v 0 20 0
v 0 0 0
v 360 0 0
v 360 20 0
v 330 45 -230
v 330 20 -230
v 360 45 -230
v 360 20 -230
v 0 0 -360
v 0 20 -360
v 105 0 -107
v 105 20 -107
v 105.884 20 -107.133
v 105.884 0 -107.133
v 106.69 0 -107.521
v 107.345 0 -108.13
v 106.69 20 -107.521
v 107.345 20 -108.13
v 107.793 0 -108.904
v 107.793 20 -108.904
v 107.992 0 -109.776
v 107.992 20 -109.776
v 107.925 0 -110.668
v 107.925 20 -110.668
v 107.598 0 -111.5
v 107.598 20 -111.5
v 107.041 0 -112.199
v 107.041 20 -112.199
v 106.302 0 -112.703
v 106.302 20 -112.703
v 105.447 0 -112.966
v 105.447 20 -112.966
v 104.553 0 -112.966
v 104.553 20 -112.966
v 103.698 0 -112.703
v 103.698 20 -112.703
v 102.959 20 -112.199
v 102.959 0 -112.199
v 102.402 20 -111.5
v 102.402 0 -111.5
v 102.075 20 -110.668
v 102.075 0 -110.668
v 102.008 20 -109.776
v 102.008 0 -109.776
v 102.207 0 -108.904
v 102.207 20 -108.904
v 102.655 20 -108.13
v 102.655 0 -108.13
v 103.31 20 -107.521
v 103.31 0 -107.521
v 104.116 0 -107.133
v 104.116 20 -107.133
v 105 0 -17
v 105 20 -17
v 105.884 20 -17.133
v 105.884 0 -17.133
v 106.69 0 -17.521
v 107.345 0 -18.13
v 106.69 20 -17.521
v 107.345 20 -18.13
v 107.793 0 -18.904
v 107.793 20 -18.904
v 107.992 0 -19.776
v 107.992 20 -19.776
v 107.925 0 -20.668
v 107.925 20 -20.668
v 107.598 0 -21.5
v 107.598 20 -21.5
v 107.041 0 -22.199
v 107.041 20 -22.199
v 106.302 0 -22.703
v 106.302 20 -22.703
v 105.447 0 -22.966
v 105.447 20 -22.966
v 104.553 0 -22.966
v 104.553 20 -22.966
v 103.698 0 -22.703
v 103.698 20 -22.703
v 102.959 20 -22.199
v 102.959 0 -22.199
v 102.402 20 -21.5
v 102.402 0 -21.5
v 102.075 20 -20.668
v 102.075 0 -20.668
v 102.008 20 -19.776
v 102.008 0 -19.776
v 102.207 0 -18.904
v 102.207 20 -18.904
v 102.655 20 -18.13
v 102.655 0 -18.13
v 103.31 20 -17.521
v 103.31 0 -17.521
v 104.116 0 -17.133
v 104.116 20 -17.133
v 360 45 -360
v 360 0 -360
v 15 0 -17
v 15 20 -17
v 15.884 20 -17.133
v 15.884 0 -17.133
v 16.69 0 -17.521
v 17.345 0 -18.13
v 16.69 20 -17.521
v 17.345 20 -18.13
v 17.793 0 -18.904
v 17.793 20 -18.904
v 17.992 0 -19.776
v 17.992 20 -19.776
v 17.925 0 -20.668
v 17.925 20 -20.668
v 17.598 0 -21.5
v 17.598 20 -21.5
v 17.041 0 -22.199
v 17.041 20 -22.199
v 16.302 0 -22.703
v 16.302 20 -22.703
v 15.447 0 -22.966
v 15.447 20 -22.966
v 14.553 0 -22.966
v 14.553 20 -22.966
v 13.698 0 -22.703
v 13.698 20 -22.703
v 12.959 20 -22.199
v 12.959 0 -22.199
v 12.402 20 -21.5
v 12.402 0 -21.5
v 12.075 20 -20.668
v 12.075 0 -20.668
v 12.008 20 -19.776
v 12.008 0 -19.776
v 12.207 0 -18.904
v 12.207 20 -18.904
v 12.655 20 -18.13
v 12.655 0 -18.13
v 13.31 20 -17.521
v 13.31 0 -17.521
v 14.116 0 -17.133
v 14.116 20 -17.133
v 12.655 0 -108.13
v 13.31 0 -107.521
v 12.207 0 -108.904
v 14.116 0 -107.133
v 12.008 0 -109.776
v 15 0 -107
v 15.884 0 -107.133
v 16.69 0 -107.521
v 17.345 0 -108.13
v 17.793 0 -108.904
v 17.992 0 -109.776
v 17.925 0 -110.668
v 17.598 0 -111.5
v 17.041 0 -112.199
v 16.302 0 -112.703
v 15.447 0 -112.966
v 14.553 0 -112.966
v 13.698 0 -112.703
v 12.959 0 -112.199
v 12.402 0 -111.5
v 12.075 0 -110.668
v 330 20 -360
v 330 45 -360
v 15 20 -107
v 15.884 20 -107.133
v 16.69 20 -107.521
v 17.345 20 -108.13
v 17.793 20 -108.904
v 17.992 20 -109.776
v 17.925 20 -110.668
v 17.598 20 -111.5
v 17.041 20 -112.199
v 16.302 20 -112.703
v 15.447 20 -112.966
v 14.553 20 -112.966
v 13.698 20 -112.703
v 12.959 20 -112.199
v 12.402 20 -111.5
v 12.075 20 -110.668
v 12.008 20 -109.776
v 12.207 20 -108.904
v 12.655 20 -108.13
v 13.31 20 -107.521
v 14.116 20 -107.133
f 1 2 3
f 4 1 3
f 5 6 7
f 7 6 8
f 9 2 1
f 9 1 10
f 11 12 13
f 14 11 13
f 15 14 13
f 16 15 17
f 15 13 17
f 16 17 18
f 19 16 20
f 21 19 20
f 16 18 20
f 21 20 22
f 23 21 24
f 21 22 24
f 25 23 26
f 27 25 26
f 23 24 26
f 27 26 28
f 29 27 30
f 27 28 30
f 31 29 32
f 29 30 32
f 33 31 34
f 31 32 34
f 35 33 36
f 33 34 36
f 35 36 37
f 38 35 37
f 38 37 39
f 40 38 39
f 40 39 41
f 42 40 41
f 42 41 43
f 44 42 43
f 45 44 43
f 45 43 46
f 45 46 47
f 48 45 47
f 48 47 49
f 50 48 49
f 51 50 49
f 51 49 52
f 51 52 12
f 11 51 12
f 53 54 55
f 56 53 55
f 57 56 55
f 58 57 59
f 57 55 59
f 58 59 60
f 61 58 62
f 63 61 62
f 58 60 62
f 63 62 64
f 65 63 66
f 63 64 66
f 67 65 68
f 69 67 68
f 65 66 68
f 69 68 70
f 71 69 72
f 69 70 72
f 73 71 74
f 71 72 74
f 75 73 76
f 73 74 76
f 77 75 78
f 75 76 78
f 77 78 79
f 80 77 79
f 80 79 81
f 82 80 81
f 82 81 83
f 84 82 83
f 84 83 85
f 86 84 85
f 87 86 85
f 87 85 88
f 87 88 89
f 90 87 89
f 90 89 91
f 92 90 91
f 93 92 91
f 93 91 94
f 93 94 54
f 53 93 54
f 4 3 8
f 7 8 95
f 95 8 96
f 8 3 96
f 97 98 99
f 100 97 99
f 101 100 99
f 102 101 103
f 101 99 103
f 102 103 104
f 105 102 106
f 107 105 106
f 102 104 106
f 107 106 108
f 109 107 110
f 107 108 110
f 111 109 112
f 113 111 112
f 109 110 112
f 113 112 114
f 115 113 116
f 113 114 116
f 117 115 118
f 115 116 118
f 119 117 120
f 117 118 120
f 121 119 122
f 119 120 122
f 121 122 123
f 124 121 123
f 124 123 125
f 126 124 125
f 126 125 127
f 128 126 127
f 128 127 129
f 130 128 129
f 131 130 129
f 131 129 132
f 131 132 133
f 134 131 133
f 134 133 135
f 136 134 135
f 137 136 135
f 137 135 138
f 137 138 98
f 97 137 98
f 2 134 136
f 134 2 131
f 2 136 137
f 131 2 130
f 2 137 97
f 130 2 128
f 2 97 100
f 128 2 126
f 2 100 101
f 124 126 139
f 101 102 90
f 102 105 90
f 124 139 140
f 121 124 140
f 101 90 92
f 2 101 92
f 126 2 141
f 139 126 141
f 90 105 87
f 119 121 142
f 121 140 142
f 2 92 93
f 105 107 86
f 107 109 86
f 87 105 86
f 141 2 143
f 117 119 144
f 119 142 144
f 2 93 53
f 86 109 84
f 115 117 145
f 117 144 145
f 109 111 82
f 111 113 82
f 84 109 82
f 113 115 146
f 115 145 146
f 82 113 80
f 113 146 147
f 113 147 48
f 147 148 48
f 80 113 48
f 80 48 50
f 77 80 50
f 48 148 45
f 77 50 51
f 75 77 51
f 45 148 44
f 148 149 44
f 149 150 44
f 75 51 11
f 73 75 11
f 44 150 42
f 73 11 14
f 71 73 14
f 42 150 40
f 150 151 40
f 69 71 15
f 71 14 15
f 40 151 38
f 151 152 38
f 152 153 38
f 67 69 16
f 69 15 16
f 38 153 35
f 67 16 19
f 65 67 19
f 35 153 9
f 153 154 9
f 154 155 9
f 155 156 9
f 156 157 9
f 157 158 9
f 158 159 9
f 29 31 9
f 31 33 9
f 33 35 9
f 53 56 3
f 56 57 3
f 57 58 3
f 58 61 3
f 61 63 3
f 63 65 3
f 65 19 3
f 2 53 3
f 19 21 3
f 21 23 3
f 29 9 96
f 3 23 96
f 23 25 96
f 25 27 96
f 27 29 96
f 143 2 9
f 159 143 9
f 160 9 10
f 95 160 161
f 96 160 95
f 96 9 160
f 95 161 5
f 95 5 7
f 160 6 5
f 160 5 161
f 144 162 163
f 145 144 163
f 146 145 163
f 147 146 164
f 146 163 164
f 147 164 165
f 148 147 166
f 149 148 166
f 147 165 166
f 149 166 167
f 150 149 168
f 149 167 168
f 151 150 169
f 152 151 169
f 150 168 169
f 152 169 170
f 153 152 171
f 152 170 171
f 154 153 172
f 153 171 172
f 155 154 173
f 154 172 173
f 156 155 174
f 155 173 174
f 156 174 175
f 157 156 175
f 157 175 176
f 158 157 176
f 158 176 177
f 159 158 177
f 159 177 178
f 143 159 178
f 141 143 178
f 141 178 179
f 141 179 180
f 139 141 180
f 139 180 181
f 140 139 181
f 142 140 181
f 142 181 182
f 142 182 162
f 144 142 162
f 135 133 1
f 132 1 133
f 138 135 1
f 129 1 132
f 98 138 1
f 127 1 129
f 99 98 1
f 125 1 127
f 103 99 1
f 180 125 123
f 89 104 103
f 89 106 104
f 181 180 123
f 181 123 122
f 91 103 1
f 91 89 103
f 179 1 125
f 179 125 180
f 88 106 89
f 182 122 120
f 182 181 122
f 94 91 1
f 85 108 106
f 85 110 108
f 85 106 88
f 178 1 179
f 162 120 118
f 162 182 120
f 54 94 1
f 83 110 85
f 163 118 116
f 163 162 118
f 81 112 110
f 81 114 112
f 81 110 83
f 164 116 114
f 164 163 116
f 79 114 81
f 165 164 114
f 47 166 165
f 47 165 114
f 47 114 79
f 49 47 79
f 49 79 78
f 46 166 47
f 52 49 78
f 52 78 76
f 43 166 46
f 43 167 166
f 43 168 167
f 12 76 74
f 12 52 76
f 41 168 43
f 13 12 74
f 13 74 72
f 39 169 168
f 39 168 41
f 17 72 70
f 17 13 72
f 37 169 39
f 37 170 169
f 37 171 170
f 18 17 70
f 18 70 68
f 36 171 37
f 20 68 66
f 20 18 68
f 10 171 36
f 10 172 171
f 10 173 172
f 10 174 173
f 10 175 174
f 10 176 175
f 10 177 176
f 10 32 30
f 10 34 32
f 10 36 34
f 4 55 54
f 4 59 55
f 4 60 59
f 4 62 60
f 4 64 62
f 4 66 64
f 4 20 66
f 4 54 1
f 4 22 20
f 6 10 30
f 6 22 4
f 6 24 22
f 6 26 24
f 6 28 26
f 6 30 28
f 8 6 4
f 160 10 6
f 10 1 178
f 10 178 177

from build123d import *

# Parameters (mm, degrees)
SKETCH_1_W          = 360
SKETCH_1_H          = 360
EXTRUDE_1_DEPTH     = 20
SKETCH_4_W          = 30
SKETCH_4_H          = 130
EXTRUDE_3_DEPTH     = 25
SKETCH_5_R          = 3
CUT_EXTRUDE_2_DEPTH = 25


with BuildPart() as part:
    # 草图1 → 凸台-拉伸1 (new body)
    with BuildSketch(Plane(origin=(0, 0, 0), x_dir=(1, 0, 0), z_dir=(0, 1, 0))):
        with Locations((180, 180)):
            Rectangle(SKETCH_1_W, SKETCH_1_H)
    extrude(amount=EXTRUDE_1_DEPTH)

    # 草图4 → 凸台-拉伸3 (add)
    with BuildSketch(Plane(origin=(0, 20, 0), x_dir=(1, 0, 0), z_dir=(0, 1, 0))):
        with Locations((345, 295)):
            Rectangle(SKETCH_4_W, SKETCH_4_H)
    extrude(amount=EXTRUDE_3_DEPTH)

    # 草图5 → 切除-拉伸2 (cut)
    with BuildSketch(Plane(origin=(0, 20, 0), x_dir=(1, 0, 0), z_dir=(0, 1, 0))):
        with Locations(Location((15, 110, 0), (0, 0, 270))):
            Circle(SKETCH_5_R)
        with Locations(Location((105, 110, 0), (0, 0, 270))):
            Circle(SKETCH_5_R)
        with Locations(Location((15, 20, 0), (0, 0, 270))):
            Circle(SKETCH_5_R)
        with Locations(Location((105, 20, 0), (0, 0, 270))):
            Circle(SKETCH_5_R)
    extrude(amount=-CUT_EXTRUDE_2_DEPTH, mode=Mode.SUBTRACT)


solid = part.part
